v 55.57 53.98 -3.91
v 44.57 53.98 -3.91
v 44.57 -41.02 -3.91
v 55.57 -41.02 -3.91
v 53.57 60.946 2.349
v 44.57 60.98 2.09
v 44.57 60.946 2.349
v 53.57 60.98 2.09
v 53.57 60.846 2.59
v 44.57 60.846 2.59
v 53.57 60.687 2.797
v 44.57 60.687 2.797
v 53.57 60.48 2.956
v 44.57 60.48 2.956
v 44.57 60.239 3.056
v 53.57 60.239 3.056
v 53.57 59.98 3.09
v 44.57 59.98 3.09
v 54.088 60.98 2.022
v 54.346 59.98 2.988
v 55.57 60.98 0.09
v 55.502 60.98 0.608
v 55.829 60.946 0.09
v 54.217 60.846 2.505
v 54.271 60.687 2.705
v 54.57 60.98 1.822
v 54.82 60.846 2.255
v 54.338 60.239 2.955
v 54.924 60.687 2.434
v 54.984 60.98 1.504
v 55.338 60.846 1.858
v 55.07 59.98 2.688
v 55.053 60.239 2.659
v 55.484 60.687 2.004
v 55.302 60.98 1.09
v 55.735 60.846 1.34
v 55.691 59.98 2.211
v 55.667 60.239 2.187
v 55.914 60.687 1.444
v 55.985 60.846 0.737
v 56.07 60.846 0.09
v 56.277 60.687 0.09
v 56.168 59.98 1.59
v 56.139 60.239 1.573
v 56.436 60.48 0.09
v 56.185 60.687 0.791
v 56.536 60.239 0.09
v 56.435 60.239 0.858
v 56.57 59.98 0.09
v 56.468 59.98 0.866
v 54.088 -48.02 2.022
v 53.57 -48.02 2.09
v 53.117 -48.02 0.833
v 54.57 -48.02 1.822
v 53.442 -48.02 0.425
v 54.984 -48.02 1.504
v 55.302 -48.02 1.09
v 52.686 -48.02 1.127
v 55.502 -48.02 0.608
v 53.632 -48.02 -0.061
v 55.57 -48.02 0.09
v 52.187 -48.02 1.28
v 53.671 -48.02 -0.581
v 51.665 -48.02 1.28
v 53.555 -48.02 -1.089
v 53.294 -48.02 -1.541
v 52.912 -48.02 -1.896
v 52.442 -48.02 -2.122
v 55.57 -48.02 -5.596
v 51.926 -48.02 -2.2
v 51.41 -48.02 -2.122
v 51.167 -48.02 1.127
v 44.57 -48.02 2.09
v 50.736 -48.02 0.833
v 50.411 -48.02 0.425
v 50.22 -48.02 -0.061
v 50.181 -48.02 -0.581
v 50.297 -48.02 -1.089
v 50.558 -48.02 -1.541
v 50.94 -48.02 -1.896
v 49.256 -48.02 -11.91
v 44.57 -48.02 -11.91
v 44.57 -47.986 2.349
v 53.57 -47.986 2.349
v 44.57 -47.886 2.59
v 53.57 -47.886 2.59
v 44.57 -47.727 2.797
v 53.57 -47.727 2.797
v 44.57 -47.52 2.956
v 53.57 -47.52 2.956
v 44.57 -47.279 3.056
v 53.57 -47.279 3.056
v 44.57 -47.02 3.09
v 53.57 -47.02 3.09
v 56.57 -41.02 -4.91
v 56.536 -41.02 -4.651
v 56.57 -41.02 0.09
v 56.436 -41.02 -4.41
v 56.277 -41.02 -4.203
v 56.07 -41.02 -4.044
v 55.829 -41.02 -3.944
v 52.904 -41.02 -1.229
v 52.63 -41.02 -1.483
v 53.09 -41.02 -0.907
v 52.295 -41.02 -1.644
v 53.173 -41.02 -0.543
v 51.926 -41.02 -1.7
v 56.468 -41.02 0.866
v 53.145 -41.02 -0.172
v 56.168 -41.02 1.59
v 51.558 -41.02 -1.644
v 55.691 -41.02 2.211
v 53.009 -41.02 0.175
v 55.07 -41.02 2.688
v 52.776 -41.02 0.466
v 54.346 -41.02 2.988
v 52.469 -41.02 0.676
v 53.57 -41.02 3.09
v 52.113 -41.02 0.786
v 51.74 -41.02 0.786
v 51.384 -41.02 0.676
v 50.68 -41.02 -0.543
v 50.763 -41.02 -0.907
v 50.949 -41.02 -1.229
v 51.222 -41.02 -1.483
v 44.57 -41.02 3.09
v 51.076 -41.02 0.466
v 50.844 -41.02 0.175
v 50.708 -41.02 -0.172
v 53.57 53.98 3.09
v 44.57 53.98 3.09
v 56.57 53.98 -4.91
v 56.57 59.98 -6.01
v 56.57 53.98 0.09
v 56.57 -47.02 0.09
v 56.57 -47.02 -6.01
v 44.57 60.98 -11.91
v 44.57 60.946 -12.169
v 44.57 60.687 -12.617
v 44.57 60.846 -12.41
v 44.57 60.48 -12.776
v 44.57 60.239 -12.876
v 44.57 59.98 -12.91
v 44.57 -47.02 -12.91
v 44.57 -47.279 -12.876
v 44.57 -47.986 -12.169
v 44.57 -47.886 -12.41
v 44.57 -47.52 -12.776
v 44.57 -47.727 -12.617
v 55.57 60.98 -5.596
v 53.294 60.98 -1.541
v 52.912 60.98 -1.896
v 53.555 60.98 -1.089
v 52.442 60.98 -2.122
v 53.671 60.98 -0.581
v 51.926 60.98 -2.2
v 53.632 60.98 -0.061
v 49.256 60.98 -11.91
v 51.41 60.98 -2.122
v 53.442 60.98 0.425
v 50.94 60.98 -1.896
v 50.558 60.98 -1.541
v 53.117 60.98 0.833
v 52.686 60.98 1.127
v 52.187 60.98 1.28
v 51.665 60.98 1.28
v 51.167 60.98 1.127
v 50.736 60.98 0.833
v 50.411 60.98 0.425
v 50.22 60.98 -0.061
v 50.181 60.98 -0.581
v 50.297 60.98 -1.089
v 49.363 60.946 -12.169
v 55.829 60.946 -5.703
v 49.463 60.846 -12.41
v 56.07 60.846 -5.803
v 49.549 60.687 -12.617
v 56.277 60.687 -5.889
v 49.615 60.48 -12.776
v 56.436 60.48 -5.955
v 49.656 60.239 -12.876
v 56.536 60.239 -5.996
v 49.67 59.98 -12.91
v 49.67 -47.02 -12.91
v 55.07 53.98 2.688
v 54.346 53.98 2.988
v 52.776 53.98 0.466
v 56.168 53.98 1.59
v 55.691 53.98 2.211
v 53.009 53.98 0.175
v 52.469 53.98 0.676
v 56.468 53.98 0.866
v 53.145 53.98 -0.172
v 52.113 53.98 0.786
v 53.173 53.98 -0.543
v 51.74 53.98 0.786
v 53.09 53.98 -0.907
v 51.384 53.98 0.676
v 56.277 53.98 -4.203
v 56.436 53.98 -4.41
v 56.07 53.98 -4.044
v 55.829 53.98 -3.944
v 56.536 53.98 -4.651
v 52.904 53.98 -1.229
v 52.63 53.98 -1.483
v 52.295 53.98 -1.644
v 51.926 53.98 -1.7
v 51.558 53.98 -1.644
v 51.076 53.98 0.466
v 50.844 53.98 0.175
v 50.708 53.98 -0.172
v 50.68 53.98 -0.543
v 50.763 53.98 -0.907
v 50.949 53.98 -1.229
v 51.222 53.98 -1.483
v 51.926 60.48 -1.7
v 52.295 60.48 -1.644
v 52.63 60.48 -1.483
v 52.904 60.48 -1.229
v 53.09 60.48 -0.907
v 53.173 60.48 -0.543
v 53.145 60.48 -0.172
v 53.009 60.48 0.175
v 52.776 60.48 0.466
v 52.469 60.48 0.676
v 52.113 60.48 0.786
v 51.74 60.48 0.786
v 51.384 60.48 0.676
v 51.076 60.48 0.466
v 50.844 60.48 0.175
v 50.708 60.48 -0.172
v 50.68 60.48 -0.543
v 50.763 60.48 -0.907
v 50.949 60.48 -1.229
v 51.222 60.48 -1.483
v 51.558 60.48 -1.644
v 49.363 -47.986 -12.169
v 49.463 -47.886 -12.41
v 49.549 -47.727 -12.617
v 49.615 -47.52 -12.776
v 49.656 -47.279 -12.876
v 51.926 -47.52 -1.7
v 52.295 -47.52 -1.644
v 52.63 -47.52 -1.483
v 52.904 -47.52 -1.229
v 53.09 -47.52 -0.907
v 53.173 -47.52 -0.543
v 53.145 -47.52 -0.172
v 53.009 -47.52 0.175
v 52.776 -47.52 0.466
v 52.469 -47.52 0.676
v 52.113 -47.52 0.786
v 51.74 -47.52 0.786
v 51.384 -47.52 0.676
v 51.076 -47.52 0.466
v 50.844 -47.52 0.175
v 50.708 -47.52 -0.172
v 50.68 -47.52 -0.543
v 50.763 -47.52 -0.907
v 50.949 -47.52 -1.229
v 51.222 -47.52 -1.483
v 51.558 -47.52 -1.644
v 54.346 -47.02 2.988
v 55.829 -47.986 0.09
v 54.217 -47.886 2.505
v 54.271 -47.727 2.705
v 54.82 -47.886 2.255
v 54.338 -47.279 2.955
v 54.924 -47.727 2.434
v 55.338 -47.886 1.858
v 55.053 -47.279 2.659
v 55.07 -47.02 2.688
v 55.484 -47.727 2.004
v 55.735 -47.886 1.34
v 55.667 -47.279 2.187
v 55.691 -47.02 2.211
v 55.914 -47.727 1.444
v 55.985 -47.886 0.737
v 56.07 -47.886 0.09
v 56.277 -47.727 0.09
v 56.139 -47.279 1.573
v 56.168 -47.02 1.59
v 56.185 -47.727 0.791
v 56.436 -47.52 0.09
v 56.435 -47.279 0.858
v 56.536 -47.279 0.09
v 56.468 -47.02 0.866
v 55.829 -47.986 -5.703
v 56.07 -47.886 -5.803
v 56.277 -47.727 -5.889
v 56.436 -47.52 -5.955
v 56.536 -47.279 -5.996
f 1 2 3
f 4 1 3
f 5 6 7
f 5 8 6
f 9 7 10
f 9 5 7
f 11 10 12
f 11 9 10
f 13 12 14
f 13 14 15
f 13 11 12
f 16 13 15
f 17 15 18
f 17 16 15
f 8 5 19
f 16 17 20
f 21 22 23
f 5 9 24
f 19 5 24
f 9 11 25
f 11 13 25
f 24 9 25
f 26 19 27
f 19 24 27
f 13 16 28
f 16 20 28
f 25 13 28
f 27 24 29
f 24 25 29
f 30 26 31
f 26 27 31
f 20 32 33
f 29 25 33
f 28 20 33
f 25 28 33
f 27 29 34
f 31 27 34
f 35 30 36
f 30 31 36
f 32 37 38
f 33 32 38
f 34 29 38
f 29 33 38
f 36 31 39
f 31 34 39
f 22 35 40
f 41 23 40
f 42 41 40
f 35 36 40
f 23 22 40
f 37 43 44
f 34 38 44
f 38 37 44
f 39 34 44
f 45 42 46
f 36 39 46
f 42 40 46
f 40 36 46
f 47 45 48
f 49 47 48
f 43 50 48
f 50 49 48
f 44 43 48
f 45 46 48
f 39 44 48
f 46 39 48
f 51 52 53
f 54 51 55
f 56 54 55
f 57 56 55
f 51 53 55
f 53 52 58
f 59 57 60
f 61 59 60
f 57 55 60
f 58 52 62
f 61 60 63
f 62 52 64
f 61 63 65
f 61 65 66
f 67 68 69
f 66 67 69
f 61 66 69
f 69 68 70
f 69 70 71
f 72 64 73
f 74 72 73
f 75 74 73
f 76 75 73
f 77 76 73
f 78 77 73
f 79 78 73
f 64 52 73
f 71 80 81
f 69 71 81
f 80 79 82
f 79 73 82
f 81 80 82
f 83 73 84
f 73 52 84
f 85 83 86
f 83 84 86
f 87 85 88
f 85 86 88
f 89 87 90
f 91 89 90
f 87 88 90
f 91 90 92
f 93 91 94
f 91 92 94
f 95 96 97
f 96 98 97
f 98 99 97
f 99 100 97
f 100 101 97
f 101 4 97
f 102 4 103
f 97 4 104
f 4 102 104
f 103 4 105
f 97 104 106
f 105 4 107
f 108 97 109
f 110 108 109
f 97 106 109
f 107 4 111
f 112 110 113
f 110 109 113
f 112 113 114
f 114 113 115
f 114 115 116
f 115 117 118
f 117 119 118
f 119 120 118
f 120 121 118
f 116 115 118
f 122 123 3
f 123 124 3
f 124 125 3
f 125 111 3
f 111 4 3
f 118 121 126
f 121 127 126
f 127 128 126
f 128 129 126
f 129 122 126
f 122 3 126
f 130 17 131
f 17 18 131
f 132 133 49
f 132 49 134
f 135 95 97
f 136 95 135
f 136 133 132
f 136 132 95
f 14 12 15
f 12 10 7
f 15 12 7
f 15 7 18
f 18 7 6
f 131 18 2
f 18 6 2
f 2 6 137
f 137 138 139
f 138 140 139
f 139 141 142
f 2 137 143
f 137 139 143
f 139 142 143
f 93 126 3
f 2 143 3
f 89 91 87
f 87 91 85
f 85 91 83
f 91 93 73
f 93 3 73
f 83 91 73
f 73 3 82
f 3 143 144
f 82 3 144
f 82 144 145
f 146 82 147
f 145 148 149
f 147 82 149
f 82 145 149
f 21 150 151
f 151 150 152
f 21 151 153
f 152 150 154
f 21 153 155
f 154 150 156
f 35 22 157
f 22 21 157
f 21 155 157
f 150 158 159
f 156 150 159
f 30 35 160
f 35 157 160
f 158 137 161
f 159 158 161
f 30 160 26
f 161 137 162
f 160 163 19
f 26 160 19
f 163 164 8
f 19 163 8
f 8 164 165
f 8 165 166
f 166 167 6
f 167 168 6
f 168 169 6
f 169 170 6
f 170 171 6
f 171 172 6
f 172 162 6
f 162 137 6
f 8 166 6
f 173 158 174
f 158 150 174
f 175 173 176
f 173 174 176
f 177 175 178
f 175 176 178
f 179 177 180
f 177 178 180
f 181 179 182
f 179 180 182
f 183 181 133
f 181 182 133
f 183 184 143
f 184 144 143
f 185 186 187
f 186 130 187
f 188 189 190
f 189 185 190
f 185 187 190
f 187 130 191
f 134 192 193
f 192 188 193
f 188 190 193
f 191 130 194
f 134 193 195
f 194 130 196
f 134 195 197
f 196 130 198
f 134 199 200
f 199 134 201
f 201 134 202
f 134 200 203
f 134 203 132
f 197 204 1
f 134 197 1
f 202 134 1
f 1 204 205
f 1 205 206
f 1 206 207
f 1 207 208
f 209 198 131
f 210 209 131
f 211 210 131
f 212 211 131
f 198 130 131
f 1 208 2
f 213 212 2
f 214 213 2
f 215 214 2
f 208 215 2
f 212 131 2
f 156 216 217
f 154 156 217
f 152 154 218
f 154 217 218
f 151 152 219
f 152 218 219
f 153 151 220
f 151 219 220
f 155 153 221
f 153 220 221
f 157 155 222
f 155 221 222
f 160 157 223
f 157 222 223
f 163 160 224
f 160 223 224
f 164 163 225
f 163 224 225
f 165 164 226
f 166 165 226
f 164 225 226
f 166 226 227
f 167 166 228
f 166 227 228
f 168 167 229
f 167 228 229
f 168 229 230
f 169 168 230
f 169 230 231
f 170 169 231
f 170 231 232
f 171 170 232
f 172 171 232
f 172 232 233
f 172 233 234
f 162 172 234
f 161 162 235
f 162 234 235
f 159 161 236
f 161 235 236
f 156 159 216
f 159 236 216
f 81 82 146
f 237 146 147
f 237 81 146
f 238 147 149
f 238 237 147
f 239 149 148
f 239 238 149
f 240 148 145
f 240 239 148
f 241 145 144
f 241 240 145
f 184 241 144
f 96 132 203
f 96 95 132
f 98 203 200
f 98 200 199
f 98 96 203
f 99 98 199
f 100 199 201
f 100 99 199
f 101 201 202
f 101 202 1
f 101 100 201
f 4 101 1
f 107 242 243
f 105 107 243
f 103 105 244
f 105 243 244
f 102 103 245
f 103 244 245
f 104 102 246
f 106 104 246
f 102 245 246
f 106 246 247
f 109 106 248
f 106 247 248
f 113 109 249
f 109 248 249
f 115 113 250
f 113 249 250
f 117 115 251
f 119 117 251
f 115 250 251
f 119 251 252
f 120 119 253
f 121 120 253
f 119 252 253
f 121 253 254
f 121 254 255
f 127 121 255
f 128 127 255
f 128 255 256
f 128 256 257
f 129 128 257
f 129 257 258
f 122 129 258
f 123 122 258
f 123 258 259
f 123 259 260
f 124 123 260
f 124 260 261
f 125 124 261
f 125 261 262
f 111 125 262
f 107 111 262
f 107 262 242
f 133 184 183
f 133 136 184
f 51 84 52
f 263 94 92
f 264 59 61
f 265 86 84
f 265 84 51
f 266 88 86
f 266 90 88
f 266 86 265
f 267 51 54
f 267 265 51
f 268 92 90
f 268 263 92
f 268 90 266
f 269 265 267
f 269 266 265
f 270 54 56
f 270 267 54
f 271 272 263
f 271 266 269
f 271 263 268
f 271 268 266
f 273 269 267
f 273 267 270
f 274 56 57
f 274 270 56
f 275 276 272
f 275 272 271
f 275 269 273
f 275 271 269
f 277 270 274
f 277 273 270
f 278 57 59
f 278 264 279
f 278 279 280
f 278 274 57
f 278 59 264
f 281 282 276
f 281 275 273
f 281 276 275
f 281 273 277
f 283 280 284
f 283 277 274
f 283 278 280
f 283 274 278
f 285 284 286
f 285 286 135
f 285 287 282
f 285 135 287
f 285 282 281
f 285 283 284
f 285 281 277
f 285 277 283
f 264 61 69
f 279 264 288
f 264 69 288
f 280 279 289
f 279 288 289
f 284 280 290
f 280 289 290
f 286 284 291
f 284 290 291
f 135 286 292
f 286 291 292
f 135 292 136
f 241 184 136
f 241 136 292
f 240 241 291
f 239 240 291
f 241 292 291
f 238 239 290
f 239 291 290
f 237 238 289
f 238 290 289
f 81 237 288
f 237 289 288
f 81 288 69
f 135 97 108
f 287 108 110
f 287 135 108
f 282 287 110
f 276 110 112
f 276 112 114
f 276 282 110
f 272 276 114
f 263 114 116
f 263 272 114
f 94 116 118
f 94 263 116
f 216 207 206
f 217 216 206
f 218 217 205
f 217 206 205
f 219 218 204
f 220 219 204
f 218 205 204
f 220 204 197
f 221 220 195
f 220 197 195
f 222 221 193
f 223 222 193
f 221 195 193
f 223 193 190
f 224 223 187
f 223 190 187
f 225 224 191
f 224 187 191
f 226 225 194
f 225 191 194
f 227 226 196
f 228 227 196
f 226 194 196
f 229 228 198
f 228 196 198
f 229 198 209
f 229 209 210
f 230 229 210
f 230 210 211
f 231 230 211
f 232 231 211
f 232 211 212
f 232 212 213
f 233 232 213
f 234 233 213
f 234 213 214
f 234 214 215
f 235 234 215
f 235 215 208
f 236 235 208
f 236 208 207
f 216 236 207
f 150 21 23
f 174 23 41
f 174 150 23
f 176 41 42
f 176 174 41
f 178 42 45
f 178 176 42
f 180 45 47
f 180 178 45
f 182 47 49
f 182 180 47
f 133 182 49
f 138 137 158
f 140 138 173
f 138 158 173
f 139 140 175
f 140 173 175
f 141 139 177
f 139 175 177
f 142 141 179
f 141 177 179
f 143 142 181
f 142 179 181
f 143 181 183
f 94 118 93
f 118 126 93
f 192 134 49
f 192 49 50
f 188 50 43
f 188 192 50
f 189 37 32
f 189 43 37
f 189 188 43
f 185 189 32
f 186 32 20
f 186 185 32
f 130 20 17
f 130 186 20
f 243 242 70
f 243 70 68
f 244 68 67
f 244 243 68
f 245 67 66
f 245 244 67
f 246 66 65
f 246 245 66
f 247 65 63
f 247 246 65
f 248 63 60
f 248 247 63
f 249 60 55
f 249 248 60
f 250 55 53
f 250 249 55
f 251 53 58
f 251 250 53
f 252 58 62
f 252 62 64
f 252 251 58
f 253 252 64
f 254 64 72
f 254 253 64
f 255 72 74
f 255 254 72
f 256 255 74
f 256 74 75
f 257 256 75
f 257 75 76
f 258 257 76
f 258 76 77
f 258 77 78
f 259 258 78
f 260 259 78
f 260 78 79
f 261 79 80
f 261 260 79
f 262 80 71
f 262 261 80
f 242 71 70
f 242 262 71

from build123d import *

# Parameters (mm, degrees)
PAD013_DEPTH            = 12
CHAMFER013_SIZE         = 6.9
FILLET028_R             = 1
FILLET027_R             = 3
FILLET029_R             = 1
SKETCH052_R             = 1.25
POCKET020_DEPTH         = 109.001
CHAMFER014_SIZE         = 0.5
FILLET031_R             = 1
BODY012_PLACEMENT_ANGLE = 180


with BuildPart() as part:
    # Sketch051 → Pad013 (new body)
    with BuildSketch(Plane.YZ.offset(37)):
        Polygon((-48, 6), (-41, 6), (-41, 13), (54, 13), (54, 6), (61, 6), (61, 22), (-48, 22), align=None)
    extrude(amount=PAD013_DEPTH)

    # Chamfer013
    chamfer013_edges = [part.edges().sort_by_distance(p)[0] for p in [
        (49, 6.5, 22),
    ]]
    chamfer(chamfer013_edges, length=CHAMFER013_SIZE)

    # Fillet028
    fillet028_edges = [part.edges().sort_by_distance(p)[0] for p in [
        (49, 6.5, 13),
    ]]
    fillet(fillet028_edges, radius=FILLET028_R)

    # Fillet027
    fillet027_edges = [part.edges().sort_by_distance(p)[0] for p in [
        (49, 57.5, 6),
        (49, -44.5, 6),
    ]]
    fillet(fillet027_edges, radius=FILLET027_R)

    # Fillet029
    fillet029_edges = [part.edges().sort_by_distance(p)[0] for p in [
        (41.5, 61, 6),
        (48.12132, 61, 6.87868),
        (49, 61, 12.05),
        (45.55, 61, 18.55),
        (39.55, 61, 22),
    ]]
    fillet(fillet029_edges, radius=FILLET029_R)

    # Sketch052 (on Face12 of Fillet029) → Pocket020 (cut, through all)
    with BuildSketch(Plane.ZX.offset(61)):
        with Locations((9.54001, 44.356239)):
            Circle(SKETCH052_R)
    extrude(amount=-POCKET020_DEPTH, mode=Mode.SUBTRACT)

    # Chamfer014
    chamfer014_edges = [part.edges().sort_by_distance(p)[0] for p in [
        (44.356239, 61, 8.29001),
        (44.356239, -48, 8.29001),
    ]]
    chamfer(chamfer014_edges, length=CHAMFER014_SIZE)

    # Fillet031
    fillet031_edges = [part.edges().sort_by_distance(p)[0] for p in [
        (41.5, -48, 6),
        (48.12132, -48, 6.87868),
        (49, -48, 12.05),
        (45.55, -48, 18.55),
        (39.55, -48, 22),
    ]]
    fillet(fillet031_edges, radius=FILLET031_R)


with BuildPart() as part_1:
    # Body012 placement: moved
    add(part.part.moved(Location((7.57, 12.98, 9.09))).rotate(Axis((7.57, 12.98, 9.09), (1, 0, 0)), BODY012_PLACEMENT_ANGLE))


solid = part_1.part
